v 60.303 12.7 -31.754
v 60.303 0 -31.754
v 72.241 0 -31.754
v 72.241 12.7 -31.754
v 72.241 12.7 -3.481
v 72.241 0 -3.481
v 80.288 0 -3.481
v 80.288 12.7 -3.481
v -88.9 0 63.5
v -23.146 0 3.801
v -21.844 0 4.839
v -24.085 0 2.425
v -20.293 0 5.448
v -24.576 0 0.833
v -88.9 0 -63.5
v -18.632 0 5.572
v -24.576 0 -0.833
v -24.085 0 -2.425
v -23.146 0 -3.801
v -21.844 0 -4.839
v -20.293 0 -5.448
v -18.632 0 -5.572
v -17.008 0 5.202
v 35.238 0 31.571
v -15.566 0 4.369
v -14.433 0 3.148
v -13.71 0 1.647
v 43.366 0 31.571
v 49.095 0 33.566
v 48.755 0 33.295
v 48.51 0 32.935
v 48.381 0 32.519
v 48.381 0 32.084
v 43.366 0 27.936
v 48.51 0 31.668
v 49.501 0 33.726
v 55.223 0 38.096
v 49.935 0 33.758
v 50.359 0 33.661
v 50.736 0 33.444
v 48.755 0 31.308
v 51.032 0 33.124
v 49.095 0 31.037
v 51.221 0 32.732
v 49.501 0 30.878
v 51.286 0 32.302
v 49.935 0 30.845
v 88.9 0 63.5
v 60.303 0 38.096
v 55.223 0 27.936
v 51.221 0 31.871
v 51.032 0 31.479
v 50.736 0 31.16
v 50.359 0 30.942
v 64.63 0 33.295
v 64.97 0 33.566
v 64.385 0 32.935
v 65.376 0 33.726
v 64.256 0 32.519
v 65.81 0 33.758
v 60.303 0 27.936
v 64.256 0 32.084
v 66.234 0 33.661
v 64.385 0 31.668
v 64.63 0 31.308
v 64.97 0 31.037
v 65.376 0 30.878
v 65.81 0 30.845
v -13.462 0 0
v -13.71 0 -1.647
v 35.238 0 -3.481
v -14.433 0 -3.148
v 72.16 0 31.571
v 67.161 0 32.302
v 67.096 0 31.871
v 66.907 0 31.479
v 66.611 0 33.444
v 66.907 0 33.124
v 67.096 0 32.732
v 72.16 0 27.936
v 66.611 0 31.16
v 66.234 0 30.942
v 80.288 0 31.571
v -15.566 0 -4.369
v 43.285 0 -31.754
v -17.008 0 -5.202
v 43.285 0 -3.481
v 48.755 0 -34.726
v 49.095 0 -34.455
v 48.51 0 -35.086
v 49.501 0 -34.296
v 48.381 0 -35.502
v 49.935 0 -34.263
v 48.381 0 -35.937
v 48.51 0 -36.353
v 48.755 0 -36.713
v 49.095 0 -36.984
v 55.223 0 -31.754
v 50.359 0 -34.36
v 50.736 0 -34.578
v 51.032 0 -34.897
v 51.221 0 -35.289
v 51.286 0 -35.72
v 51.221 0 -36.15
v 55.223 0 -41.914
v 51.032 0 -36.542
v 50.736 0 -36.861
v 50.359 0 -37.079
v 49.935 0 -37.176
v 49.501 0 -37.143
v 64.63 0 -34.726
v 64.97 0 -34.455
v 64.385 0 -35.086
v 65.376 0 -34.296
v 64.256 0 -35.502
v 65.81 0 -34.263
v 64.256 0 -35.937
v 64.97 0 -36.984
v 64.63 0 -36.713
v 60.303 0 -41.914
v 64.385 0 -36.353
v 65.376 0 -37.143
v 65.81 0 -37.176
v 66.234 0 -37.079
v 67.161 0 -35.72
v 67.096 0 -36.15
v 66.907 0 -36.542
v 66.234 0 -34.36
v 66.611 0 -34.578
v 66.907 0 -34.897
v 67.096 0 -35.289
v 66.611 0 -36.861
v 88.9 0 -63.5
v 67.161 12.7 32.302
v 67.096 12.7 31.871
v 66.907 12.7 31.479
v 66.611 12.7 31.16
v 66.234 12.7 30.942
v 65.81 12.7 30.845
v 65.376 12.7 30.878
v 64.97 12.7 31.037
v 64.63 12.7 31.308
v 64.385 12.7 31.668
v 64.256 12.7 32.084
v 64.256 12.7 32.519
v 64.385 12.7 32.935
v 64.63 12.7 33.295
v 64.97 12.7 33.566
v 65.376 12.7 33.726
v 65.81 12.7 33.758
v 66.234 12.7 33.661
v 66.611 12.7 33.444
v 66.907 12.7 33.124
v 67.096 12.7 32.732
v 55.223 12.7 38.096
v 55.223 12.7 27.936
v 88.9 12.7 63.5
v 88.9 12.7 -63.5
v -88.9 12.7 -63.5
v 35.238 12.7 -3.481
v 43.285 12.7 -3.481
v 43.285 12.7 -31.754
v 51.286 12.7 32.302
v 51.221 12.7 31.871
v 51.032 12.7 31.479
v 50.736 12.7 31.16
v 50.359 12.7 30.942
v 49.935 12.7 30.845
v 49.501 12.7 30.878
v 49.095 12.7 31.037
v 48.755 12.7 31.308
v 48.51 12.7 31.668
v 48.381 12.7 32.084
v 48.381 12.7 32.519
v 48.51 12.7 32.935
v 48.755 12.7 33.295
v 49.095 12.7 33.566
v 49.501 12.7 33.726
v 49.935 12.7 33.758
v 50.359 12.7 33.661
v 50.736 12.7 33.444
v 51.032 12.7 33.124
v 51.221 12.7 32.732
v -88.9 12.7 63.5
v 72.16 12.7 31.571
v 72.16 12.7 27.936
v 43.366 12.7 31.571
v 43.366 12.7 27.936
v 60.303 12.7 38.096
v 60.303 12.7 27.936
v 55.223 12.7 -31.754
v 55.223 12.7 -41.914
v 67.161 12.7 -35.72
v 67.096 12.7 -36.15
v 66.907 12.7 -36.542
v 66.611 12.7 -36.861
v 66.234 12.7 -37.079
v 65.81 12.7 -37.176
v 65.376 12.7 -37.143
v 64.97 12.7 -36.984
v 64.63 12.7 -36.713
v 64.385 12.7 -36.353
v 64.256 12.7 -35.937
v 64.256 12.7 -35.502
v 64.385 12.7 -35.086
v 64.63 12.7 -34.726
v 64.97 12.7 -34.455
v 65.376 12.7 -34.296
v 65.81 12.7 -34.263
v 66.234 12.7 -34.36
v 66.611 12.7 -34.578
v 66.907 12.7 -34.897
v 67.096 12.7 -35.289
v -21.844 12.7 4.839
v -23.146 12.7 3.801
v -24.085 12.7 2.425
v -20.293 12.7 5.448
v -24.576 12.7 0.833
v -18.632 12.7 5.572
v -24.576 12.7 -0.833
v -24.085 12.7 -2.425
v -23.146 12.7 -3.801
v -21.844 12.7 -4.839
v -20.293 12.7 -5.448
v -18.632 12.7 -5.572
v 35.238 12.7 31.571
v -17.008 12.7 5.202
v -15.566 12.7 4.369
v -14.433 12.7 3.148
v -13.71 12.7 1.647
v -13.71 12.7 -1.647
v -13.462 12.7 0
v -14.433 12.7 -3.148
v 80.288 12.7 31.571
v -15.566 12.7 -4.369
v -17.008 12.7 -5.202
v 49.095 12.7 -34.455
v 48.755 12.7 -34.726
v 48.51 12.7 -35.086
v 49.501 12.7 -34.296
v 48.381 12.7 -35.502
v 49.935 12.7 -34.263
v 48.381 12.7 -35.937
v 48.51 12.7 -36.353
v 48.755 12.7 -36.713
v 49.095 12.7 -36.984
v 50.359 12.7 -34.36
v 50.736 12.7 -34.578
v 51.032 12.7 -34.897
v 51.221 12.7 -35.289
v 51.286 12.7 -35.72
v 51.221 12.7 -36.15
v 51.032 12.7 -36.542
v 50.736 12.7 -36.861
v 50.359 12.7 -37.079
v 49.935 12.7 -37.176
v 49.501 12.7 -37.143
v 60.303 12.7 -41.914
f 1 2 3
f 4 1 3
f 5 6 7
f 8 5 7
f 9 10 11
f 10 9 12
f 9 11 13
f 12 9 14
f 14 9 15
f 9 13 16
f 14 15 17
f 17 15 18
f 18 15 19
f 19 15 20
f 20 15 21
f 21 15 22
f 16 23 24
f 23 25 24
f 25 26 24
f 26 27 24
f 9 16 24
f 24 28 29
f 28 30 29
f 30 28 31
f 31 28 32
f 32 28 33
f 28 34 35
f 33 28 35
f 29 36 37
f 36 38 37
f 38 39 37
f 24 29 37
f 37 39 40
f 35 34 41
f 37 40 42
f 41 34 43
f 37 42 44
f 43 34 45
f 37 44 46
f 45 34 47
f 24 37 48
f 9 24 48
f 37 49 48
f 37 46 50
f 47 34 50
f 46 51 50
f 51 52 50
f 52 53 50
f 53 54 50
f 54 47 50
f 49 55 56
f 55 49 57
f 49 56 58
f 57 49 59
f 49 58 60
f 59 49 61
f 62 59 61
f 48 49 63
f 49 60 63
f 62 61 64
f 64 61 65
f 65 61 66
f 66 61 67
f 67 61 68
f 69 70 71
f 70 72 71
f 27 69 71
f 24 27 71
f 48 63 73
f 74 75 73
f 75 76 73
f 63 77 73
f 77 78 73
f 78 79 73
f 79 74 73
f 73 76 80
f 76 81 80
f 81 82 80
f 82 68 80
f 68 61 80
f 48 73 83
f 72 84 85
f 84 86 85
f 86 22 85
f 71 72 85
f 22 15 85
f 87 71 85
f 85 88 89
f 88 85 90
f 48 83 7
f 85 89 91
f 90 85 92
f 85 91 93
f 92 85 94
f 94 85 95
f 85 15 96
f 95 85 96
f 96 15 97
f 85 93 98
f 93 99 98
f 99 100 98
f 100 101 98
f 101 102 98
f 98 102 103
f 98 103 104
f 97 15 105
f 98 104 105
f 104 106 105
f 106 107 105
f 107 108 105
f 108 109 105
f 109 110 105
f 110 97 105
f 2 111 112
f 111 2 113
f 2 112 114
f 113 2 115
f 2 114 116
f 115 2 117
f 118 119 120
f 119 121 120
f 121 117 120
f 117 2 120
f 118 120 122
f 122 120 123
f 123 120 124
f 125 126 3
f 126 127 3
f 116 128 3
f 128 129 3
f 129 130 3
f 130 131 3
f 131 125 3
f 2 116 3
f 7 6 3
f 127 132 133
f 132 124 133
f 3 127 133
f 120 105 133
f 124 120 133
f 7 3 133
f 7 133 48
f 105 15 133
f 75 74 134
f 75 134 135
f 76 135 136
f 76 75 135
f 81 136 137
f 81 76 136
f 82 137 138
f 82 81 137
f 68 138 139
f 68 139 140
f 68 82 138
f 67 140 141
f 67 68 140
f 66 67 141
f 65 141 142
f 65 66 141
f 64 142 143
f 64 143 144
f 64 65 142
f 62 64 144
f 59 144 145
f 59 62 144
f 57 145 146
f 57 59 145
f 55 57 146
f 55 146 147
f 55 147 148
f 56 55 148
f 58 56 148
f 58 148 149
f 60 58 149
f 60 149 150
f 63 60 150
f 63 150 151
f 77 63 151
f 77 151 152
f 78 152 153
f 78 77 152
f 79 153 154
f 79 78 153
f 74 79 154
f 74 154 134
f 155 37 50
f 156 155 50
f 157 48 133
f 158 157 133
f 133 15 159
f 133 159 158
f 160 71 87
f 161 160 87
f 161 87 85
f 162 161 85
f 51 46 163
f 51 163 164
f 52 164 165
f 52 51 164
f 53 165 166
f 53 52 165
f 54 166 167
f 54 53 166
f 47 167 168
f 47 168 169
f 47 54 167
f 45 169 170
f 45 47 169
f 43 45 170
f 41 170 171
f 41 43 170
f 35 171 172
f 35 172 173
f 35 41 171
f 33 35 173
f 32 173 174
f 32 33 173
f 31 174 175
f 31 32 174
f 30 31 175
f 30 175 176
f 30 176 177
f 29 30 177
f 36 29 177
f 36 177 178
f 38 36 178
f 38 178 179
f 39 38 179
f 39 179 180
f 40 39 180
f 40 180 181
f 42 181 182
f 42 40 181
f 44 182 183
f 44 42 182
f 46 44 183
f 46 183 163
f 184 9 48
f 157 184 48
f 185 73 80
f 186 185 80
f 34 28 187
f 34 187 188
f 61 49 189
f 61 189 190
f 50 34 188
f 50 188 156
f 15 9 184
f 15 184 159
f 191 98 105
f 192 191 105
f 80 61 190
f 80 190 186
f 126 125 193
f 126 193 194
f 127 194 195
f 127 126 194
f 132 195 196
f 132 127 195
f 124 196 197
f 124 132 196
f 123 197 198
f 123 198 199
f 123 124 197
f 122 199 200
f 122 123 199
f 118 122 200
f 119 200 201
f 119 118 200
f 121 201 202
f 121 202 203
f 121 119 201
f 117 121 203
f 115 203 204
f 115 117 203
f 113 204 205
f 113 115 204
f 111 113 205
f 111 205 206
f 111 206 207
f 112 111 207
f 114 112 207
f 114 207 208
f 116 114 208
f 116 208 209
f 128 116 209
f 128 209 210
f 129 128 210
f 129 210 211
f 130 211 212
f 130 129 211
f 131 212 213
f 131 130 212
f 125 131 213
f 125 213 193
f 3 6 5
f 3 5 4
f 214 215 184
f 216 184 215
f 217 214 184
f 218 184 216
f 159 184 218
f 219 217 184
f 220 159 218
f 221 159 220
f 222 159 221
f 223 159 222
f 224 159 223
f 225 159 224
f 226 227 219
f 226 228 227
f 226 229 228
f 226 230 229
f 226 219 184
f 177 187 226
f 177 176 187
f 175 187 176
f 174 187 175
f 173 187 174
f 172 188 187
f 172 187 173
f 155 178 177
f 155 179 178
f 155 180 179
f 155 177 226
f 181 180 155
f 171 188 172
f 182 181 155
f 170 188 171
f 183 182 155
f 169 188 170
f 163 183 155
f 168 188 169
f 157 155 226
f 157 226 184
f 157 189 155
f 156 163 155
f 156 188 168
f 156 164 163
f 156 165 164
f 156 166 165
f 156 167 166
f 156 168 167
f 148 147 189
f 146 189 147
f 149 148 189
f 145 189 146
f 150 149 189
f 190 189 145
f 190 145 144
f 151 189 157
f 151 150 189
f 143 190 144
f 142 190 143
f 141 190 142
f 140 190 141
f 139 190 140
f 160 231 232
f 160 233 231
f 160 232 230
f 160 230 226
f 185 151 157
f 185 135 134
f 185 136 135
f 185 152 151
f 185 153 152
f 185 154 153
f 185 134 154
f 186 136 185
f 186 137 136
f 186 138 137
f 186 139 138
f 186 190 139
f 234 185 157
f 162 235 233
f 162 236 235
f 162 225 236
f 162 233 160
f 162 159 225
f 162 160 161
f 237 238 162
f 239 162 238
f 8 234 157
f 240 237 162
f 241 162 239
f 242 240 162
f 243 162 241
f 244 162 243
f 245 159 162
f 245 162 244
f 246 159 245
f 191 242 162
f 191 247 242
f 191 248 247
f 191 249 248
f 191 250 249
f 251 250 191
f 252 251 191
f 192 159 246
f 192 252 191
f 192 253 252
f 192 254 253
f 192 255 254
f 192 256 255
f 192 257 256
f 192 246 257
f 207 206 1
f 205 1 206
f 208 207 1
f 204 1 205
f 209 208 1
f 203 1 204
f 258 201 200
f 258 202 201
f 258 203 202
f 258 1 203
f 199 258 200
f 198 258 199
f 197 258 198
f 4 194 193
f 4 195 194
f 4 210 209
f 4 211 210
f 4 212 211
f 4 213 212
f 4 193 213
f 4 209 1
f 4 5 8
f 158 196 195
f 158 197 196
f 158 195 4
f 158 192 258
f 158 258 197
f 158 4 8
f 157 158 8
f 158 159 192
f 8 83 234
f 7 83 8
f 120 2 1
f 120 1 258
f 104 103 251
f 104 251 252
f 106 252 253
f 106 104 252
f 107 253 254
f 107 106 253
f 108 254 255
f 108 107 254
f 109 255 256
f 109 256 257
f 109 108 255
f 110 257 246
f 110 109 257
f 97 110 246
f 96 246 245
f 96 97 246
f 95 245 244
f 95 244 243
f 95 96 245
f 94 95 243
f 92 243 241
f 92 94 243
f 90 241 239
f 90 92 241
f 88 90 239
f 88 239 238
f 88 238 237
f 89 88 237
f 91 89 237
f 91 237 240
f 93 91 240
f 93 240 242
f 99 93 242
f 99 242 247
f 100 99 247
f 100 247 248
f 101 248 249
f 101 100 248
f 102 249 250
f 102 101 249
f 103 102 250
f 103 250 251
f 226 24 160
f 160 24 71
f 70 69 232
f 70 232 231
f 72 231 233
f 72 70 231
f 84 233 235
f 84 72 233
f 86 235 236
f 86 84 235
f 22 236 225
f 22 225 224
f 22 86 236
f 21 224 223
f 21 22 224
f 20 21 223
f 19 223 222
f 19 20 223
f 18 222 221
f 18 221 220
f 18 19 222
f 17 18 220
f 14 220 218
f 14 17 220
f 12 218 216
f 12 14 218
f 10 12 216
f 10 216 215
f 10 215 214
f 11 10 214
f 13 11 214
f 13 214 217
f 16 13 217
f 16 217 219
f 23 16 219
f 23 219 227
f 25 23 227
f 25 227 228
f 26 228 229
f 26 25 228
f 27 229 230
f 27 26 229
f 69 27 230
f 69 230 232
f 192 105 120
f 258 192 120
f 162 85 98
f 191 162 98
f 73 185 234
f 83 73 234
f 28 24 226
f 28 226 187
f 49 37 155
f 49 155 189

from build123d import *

# Parameters (mm, degrees)
SKETCH1_W           = 177.8
SKETCH1_H           = 127
SKETCH1_R           = 5.588
SKETCH1_R_2         = 1.4605
SKETCH1_W_2         = 28.956
SKETCH1_H_2         = 59.69
BOSS_EXTRUDE1_DEPTH = 12.7
SKETCH3_W           = 8.128
SKETCH3_H           = 35.052
SKETCH3_W_2         = 5.08
SKETCH3_H_2         = 10.16
CUT_EXTRUDE3_DEPTH  = 13.7


with BuildPart() as part:
    # Sketch1 → Boss-Extrude1 (new body)
    with BuildSketch(Plane(origin=(0, 0, 0), x_dir=(1, 0, 0), z_dir=(0, 1, 0))):
        Rectangle(SKETCH1_W, SKETCH1_H)
        with Locations((-19.05, 0)):
            Circle(SKETCH1_R, mode=Mode.SUBTRACT)
        with Locations((49.825565695, -32.301655548)):
            Circle(SKETCH1_R_2, mode=Mode.SUBTRACT)
        with Locations((65.700565695, -32.301655548)):
            Circle(SKETCH1_R_2, mode=Mode.SUBTRACT)
        with Locations((49.825565695, 35.719544452)):
            Circle(SKETCH1_R_2, mode=Mode.SUBTRACT)
        with Locations((65.700565695, 35.719544452)):
            Circle(SKETCH1_R_2, mode=Mode.SUBTRACT)
        with Locations((57.763065695, 1.908969452)):
            Rectangle(SKETCH1_W_2, SKETCH1_H_2, mode=Mode.SUBTRACT)
    extrude(amount=BOSS_EXTRUDE1_DEPTH)

    # Sketch3 → Cut-Extrude3 (cut, through all)
    with BuildSketch(Plane(origin=(0, 0, 0), x_dir=(1, 0, 0), z_dir=(0, 1, 0))):
        with Locations((39.301988782, -14.045405548)):
            Rectangle(SKETCH3_W, SKETCH3_H)
        with Locations((76.224142608, -14.045405548)):
            Rectangle(SKETCH3_W, SKETCH3_H)
        with Locations((57.763065695, -33.016030548)):
            Rectangle(SKETCH3_W_2, SKETCH3_H_2)
        with Locations((57.763065695, 36.833969452)):
            Rectangle(SKETCH3_W_2, SKETCH3_H_2)
    extrude(amount=CUT_EXTRUDE3_DEPTH, mode=Mode.SUBTRACT)


solid = part.part
